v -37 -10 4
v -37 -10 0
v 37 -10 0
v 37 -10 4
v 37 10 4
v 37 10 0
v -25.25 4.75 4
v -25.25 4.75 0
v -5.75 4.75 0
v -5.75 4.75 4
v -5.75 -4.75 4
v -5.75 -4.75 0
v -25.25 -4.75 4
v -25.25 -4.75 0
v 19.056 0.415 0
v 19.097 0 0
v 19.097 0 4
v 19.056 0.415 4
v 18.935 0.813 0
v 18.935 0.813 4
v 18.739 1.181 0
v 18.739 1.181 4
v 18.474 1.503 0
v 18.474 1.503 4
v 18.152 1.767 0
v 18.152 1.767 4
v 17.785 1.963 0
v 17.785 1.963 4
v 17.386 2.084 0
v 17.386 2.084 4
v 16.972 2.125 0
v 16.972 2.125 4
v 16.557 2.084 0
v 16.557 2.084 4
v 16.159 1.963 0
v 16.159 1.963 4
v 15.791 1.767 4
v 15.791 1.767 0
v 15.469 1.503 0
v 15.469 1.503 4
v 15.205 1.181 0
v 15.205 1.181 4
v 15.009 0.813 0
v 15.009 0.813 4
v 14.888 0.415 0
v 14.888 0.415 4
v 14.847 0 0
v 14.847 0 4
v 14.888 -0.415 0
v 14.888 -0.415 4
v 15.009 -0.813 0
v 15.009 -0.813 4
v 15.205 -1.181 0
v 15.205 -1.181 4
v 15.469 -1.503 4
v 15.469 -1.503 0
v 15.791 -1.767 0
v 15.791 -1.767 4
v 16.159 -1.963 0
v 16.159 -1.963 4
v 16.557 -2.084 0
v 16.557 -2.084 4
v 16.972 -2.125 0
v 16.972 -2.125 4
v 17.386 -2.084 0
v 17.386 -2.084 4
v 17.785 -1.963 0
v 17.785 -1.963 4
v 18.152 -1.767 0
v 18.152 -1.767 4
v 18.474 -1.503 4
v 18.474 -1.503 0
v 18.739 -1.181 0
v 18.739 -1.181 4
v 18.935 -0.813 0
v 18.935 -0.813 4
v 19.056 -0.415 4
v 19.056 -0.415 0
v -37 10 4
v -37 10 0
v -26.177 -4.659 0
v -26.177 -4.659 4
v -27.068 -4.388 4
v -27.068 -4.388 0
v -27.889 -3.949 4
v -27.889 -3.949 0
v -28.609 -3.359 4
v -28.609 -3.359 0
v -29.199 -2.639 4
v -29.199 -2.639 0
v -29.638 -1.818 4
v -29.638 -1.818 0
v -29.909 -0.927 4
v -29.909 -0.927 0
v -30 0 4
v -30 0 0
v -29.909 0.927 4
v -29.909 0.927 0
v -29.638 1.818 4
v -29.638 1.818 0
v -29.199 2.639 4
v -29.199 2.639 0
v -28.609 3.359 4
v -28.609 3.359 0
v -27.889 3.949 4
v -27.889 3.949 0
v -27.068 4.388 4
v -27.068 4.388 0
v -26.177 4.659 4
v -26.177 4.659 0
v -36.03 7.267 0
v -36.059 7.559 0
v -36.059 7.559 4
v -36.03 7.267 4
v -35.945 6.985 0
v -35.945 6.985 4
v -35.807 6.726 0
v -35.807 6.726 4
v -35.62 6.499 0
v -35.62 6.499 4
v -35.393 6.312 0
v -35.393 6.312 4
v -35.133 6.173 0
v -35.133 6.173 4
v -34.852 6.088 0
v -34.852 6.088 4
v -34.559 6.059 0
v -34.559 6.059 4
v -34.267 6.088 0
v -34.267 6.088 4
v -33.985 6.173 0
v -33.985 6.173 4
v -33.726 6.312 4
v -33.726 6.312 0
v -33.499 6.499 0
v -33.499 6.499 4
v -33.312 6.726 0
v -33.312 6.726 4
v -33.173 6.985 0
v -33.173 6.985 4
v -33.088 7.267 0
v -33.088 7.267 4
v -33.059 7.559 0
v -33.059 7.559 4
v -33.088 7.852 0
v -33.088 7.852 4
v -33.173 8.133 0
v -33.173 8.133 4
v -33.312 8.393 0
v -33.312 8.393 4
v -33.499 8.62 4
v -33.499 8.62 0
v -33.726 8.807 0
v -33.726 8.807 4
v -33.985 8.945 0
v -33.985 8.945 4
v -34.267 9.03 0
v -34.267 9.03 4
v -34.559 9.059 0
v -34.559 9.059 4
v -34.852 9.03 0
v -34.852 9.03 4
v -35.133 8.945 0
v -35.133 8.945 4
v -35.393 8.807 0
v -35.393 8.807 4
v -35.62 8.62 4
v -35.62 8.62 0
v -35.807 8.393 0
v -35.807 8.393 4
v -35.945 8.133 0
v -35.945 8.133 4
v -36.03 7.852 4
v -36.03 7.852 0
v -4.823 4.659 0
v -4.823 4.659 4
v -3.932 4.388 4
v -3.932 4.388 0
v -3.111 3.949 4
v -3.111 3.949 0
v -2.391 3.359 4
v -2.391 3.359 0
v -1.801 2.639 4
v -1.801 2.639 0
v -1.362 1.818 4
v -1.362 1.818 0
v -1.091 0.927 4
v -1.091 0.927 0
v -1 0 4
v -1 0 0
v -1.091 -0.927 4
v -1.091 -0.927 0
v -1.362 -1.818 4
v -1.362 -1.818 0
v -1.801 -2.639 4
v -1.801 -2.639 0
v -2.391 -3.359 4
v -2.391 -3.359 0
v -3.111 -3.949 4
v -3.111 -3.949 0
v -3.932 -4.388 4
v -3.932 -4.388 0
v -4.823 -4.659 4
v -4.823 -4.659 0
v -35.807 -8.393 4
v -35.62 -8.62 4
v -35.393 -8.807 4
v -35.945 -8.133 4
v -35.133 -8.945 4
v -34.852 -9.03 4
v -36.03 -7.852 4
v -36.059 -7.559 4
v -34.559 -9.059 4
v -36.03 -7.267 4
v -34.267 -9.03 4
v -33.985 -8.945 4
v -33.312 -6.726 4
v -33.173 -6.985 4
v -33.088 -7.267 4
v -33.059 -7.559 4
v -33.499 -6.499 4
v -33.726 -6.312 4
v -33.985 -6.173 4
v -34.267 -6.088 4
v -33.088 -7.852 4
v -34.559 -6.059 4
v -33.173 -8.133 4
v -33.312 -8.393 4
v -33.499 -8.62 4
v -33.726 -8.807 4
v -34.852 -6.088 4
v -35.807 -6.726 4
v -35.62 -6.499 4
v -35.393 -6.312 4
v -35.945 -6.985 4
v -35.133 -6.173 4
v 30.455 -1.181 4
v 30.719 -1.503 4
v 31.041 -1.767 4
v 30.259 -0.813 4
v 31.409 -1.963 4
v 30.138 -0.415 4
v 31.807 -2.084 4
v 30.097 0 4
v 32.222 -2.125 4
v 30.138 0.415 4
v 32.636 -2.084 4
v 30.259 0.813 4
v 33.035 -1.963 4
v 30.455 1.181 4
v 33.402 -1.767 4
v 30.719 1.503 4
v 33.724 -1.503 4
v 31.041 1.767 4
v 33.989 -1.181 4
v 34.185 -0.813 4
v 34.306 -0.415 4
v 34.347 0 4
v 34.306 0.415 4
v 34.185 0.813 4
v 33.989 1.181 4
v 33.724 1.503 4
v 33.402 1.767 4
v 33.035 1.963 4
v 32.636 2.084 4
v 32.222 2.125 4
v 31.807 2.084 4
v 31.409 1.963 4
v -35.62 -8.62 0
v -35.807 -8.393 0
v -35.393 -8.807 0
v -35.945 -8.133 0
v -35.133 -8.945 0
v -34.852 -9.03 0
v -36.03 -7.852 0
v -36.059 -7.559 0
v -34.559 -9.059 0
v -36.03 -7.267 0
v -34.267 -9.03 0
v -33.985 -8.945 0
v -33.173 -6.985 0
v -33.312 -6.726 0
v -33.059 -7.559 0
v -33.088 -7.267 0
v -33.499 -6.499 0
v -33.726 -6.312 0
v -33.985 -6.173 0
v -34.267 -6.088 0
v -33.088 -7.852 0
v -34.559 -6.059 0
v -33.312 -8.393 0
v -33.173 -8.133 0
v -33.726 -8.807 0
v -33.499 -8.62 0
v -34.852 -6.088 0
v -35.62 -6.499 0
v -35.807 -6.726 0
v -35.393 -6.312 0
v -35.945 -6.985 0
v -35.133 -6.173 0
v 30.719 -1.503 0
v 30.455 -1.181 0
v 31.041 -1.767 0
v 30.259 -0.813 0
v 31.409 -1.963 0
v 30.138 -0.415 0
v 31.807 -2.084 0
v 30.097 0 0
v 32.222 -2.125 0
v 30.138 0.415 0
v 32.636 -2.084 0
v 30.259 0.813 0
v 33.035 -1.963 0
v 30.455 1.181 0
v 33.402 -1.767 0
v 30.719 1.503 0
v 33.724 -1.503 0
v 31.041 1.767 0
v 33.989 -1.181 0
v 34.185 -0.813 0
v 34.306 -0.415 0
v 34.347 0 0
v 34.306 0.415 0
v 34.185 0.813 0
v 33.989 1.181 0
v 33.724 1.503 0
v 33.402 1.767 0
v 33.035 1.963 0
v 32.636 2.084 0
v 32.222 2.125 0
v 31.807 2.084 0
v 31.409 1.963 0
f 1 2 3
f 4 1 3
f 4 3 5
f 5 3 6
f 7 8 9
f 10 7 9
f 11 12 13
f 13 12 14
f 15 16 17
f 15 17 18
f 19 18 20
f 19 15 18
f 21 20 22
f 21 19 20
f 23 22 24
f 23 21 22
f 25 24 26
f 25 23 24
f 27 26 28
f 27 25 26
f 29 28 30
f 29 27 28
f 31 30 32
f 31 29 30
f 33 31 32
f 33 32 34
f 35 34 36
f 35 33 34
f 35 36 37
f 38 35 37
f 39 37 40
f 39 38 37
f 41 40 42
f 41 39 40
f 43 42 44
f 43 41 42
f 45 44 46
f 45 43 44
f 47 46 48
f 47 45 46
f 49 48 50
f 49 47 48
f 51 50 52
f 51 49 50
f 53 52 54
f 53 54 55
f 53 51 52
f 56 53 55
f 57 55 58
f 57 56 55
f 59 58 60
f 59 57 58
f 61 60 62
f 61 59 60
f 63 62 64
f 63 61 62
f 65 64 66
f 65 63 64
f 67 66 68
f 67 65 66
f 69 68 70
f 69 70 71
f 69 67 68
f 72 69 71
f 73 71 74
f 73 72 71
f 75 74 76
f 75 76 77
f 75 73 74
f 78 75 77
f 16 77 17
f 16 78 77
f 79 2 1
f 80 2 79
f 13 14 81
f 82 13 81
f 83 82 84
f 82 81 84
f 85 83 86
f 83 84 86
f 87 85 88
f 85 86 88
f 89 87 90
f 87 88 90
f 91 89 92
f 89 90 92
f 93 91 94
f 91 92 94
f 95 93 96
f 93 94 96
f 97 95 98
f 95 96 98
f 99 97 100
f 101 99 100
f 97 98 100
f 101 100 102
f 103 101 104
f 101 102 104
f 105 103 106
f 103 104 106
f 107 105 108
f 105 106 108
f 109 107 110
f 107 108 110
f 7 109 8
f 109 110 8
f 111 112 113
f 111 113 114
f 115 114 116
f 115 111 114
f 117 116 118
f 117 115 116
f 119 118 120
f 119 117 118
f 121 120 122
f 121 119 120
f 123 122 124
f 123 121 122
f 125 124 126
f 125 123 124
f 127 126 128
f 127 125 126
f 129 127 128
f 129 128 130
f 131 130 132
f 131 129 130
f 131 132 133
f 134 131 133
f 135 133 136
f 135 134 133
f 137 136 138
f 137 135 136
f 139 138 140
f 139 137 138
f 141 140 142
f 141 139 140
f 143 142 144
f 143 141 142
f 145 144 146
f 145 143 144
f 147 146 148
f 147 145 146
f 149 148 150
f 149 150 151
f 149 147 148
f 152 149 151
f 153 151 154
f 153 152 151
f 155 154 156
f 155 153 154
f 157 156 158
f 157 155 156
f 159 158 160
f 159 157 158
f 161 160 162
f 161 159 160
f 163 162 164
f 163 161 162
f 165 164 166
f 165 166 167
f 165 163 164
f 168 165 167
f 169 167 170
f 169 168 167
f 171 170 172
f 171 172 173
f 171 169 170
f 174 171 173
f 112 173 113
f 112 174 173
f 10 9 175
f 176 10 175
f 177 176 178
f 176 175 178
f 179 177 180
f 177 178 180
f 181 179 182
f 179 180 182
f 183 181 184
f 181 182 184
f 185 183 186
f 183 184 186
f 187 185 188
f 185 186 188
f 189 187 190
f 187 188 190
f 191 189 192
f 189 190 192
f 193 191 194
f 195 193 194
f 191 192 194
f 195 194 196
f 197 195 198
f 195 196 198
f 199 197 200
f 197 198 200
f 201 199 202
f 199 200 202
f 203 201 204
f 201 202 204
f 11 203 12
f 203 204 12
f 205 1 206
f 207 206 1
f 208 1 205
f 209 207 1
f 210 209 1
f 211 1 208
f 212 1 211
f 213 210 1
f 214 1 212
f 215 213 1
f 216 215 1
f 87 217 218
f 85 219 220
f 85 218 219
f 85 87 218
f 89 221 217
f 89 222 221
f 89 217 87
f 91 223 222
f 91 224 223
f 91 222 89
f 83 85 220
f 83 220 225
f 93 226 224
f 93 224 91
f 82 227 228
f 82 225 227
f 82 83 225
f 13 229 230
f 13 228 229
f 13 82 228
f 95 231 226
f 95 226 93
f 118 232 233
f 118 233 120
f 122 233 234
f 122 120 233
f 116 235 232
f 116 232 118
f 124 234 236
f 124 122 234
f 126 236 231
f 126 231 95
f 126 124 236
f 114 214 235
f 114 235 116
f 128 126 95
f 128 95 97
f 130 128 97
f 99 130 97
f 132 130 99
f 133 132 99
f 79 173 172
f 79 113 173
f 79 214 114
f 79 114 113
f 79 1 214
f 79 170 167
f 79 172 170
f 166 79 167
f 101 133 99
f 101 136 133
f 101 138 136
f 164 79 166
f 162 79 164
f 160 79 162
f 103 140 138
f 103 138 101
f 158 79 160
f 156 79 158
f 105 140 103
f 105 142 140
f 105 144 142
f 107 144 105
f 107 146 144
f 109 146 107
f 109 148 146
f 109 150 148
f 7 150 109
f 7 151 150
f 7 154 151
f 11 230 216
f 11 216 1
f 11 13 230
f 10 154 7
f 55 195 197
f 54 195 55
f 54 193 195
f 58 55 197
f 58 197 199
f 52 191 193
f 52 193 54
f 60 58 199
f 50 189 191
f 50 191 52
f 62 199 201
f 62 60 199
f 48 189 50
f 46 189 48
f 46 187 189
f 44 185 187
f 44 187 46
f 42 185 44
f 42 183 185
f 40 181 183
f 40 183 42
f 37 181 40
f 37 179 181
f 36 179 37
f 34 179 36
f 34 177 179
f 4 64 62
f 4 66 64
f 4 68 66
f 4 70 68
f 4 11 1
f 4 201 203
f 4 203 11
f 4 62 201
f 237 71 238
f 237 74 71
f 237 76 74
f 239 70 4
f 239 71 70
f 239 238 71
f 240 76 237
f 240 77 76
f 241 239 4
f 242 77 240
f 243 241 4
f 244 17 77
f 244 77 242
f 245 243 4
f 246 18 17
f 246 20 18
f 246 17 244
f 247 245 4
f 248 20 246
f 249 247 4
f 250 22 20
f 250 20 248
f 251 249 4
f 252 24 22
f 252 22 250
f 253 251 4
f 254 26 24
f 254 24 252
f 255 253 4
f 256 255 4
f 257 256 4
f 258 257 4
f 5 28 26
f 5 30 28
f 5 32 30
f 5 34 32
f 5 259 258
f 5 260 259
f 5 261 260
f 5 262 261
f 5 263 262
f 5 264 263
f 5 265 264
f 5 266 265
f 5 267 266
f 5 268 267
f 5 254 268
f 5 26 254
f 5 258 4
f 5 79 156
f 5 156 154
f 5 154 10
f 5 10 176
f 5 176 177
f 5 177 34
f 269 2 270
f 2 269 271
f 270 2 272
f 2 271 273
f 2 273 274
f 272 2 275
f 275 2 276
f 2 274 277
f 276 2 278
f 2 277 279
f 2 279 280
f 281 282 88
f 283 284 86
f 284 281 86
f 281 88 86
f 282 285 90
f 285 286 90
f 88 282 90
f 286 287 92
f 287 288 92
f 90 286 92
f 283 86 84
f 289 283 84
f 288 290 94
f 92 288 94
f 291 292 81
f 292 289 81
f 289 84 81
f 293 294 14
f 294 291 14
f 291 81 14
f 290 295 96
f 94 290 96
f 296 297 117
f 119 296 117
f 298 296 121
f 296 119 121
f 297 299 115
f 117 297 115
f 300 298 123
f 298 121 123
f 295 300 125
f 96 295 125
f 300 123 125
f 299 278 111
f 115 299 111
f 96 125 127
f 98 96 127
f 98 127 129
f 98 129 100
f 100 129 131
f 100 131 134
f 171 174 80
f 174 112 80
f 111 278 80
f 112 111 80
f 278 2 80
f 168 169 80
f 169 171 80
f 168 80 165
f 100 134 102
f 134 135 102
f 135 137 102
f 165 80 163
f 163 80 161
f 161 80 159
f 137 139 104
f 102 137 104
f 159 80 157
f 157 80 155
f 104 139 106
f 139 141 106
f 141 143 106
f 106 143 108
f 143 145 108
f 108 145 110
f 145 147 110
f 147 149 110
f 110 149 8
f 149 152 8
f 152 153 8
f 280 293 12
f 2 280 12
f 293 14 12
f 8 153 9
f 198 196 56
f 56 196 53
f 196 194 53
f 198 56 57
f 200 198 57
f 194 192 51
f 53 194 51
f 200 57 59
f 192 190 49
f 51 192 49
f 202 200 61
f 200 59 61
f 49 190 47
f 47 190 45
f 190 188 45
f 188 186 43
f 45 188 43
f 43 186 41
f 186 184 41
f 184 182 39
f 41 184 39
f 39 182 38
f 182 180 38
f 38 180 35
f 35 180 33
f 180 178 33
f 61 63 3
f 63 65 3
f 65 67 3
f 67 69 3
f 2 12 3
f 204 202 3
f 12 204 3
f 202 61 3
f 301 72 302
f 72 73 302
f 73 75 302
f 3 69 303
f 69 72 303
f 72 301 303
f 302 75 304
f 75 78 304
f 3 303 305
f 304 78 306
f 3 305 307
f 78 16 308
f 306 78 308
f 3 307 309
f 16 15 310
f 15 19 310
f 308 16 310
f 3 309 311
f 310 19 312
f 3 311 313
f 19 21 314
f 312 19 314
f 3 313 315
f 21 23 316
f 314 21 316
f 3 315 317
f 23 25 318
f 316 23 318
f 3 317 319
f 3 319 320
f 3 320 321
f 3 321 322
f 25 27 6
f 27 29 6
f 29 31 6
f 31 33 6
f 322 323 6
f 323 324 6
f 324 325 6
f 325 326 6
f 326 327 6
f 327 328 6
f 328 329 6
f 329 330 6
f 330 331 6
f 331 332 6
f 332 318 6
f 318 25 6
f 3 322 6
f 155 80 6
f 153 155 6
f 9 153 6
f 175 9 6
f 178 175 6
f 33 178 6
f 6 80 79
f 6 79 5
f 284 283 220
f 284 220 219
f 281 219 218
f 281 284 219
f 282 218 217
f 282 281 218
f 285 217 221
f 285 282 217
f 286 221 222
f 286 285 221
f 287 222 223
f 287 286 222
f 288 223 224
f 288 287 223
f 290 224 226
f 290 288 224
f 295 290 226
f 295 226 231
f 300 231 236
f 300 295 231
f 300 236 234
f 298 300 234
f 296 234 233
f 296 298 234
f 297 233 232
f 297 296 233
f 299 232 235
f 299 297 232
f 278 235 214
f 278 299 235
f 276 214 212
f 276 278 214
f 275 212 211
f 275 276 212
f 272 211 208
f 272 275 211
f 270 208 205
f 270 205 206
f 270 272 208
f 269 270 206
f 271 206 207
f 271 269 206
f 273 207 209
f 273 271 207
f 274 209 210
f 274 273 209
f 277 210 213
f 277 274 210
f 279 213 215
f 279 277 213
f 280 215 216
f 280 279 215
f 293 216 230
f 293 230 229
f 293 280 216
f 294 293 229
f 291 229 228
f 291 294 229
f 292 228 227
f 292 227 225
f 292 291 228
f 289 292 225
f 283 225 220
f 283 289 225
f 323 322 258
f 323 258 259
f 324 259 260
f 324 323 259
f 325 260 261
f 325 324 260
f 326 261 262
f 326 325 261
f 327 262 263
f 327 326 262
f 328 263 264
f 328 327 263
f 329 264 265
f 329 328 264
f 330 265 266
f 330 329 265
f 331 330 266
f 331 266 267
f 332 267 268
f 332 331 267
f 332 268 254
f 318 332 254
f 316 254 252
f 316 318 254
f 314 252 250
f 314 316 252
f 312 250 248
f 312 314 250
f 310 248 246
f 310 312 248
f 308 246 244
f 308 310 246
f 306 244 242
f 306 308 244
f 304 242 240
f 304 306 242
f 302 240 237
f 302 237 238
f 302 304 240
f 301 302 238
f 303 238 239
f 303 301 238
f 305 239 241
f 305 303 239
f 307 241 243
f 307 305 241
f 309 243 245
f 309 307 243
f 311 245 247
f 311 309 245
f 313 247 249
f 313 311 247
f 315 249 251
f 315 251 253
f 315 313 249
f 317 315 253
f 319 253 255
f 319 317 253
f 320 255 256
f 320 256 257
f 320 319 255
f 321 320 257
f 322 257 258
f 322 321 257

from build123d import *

# Parameters (mm, degrees)
SKETCH1_W           = 74
SKETCH1_H           = 20
SKETCH1_R           = 2.125
SKETCH1_R_2         = 1.5
BOSS_EXTRUDE1_DEPTH = 4


with BuildPart() as part:
    # Sketch1 → Boss-Extrude1 (new body)
    with BuildSketch(Plane.XY):
        Rectangle(SKETCH1_W, SKETCH1_H)
        with Locations((32.221854305, 0)):
            Circle(SKETCH1_R, mode=Mode.SUBTRACT)
        with Locations((16.971854305, 0)):
            Circle(SKETCH1_R, mode=Mode.SUBTRACT)
        with Locations((-34.559305938, -7.559305938)):
            Circle(SKETCH1_R_2, mode=Mode.SUBTRACT)
        with Locations(Location((-34.559305938, 7.559305938, 0), (0, 0, 180))):
            Circle(SKETCH1_R_2, mode=Mode.SUBTRACT)
        with BuildLine():
            Line((-25.25, 4.75), (-5.75, 4.75))
            ThreePointArc((-5.75, 4.75), (-1, 0), (-5.75, -4.75))
            Line((-5.75, -4.75), (-25.25, -4.75))
            ThreePointArc((-25.25, -4.75), (-30, 0), (-25.25, 4.75))
        make_face(mode=Mode.SUBTRACT)
    extrude(amount=BOSS_EXTRUDE1_DEPTH)


solid = part.part
